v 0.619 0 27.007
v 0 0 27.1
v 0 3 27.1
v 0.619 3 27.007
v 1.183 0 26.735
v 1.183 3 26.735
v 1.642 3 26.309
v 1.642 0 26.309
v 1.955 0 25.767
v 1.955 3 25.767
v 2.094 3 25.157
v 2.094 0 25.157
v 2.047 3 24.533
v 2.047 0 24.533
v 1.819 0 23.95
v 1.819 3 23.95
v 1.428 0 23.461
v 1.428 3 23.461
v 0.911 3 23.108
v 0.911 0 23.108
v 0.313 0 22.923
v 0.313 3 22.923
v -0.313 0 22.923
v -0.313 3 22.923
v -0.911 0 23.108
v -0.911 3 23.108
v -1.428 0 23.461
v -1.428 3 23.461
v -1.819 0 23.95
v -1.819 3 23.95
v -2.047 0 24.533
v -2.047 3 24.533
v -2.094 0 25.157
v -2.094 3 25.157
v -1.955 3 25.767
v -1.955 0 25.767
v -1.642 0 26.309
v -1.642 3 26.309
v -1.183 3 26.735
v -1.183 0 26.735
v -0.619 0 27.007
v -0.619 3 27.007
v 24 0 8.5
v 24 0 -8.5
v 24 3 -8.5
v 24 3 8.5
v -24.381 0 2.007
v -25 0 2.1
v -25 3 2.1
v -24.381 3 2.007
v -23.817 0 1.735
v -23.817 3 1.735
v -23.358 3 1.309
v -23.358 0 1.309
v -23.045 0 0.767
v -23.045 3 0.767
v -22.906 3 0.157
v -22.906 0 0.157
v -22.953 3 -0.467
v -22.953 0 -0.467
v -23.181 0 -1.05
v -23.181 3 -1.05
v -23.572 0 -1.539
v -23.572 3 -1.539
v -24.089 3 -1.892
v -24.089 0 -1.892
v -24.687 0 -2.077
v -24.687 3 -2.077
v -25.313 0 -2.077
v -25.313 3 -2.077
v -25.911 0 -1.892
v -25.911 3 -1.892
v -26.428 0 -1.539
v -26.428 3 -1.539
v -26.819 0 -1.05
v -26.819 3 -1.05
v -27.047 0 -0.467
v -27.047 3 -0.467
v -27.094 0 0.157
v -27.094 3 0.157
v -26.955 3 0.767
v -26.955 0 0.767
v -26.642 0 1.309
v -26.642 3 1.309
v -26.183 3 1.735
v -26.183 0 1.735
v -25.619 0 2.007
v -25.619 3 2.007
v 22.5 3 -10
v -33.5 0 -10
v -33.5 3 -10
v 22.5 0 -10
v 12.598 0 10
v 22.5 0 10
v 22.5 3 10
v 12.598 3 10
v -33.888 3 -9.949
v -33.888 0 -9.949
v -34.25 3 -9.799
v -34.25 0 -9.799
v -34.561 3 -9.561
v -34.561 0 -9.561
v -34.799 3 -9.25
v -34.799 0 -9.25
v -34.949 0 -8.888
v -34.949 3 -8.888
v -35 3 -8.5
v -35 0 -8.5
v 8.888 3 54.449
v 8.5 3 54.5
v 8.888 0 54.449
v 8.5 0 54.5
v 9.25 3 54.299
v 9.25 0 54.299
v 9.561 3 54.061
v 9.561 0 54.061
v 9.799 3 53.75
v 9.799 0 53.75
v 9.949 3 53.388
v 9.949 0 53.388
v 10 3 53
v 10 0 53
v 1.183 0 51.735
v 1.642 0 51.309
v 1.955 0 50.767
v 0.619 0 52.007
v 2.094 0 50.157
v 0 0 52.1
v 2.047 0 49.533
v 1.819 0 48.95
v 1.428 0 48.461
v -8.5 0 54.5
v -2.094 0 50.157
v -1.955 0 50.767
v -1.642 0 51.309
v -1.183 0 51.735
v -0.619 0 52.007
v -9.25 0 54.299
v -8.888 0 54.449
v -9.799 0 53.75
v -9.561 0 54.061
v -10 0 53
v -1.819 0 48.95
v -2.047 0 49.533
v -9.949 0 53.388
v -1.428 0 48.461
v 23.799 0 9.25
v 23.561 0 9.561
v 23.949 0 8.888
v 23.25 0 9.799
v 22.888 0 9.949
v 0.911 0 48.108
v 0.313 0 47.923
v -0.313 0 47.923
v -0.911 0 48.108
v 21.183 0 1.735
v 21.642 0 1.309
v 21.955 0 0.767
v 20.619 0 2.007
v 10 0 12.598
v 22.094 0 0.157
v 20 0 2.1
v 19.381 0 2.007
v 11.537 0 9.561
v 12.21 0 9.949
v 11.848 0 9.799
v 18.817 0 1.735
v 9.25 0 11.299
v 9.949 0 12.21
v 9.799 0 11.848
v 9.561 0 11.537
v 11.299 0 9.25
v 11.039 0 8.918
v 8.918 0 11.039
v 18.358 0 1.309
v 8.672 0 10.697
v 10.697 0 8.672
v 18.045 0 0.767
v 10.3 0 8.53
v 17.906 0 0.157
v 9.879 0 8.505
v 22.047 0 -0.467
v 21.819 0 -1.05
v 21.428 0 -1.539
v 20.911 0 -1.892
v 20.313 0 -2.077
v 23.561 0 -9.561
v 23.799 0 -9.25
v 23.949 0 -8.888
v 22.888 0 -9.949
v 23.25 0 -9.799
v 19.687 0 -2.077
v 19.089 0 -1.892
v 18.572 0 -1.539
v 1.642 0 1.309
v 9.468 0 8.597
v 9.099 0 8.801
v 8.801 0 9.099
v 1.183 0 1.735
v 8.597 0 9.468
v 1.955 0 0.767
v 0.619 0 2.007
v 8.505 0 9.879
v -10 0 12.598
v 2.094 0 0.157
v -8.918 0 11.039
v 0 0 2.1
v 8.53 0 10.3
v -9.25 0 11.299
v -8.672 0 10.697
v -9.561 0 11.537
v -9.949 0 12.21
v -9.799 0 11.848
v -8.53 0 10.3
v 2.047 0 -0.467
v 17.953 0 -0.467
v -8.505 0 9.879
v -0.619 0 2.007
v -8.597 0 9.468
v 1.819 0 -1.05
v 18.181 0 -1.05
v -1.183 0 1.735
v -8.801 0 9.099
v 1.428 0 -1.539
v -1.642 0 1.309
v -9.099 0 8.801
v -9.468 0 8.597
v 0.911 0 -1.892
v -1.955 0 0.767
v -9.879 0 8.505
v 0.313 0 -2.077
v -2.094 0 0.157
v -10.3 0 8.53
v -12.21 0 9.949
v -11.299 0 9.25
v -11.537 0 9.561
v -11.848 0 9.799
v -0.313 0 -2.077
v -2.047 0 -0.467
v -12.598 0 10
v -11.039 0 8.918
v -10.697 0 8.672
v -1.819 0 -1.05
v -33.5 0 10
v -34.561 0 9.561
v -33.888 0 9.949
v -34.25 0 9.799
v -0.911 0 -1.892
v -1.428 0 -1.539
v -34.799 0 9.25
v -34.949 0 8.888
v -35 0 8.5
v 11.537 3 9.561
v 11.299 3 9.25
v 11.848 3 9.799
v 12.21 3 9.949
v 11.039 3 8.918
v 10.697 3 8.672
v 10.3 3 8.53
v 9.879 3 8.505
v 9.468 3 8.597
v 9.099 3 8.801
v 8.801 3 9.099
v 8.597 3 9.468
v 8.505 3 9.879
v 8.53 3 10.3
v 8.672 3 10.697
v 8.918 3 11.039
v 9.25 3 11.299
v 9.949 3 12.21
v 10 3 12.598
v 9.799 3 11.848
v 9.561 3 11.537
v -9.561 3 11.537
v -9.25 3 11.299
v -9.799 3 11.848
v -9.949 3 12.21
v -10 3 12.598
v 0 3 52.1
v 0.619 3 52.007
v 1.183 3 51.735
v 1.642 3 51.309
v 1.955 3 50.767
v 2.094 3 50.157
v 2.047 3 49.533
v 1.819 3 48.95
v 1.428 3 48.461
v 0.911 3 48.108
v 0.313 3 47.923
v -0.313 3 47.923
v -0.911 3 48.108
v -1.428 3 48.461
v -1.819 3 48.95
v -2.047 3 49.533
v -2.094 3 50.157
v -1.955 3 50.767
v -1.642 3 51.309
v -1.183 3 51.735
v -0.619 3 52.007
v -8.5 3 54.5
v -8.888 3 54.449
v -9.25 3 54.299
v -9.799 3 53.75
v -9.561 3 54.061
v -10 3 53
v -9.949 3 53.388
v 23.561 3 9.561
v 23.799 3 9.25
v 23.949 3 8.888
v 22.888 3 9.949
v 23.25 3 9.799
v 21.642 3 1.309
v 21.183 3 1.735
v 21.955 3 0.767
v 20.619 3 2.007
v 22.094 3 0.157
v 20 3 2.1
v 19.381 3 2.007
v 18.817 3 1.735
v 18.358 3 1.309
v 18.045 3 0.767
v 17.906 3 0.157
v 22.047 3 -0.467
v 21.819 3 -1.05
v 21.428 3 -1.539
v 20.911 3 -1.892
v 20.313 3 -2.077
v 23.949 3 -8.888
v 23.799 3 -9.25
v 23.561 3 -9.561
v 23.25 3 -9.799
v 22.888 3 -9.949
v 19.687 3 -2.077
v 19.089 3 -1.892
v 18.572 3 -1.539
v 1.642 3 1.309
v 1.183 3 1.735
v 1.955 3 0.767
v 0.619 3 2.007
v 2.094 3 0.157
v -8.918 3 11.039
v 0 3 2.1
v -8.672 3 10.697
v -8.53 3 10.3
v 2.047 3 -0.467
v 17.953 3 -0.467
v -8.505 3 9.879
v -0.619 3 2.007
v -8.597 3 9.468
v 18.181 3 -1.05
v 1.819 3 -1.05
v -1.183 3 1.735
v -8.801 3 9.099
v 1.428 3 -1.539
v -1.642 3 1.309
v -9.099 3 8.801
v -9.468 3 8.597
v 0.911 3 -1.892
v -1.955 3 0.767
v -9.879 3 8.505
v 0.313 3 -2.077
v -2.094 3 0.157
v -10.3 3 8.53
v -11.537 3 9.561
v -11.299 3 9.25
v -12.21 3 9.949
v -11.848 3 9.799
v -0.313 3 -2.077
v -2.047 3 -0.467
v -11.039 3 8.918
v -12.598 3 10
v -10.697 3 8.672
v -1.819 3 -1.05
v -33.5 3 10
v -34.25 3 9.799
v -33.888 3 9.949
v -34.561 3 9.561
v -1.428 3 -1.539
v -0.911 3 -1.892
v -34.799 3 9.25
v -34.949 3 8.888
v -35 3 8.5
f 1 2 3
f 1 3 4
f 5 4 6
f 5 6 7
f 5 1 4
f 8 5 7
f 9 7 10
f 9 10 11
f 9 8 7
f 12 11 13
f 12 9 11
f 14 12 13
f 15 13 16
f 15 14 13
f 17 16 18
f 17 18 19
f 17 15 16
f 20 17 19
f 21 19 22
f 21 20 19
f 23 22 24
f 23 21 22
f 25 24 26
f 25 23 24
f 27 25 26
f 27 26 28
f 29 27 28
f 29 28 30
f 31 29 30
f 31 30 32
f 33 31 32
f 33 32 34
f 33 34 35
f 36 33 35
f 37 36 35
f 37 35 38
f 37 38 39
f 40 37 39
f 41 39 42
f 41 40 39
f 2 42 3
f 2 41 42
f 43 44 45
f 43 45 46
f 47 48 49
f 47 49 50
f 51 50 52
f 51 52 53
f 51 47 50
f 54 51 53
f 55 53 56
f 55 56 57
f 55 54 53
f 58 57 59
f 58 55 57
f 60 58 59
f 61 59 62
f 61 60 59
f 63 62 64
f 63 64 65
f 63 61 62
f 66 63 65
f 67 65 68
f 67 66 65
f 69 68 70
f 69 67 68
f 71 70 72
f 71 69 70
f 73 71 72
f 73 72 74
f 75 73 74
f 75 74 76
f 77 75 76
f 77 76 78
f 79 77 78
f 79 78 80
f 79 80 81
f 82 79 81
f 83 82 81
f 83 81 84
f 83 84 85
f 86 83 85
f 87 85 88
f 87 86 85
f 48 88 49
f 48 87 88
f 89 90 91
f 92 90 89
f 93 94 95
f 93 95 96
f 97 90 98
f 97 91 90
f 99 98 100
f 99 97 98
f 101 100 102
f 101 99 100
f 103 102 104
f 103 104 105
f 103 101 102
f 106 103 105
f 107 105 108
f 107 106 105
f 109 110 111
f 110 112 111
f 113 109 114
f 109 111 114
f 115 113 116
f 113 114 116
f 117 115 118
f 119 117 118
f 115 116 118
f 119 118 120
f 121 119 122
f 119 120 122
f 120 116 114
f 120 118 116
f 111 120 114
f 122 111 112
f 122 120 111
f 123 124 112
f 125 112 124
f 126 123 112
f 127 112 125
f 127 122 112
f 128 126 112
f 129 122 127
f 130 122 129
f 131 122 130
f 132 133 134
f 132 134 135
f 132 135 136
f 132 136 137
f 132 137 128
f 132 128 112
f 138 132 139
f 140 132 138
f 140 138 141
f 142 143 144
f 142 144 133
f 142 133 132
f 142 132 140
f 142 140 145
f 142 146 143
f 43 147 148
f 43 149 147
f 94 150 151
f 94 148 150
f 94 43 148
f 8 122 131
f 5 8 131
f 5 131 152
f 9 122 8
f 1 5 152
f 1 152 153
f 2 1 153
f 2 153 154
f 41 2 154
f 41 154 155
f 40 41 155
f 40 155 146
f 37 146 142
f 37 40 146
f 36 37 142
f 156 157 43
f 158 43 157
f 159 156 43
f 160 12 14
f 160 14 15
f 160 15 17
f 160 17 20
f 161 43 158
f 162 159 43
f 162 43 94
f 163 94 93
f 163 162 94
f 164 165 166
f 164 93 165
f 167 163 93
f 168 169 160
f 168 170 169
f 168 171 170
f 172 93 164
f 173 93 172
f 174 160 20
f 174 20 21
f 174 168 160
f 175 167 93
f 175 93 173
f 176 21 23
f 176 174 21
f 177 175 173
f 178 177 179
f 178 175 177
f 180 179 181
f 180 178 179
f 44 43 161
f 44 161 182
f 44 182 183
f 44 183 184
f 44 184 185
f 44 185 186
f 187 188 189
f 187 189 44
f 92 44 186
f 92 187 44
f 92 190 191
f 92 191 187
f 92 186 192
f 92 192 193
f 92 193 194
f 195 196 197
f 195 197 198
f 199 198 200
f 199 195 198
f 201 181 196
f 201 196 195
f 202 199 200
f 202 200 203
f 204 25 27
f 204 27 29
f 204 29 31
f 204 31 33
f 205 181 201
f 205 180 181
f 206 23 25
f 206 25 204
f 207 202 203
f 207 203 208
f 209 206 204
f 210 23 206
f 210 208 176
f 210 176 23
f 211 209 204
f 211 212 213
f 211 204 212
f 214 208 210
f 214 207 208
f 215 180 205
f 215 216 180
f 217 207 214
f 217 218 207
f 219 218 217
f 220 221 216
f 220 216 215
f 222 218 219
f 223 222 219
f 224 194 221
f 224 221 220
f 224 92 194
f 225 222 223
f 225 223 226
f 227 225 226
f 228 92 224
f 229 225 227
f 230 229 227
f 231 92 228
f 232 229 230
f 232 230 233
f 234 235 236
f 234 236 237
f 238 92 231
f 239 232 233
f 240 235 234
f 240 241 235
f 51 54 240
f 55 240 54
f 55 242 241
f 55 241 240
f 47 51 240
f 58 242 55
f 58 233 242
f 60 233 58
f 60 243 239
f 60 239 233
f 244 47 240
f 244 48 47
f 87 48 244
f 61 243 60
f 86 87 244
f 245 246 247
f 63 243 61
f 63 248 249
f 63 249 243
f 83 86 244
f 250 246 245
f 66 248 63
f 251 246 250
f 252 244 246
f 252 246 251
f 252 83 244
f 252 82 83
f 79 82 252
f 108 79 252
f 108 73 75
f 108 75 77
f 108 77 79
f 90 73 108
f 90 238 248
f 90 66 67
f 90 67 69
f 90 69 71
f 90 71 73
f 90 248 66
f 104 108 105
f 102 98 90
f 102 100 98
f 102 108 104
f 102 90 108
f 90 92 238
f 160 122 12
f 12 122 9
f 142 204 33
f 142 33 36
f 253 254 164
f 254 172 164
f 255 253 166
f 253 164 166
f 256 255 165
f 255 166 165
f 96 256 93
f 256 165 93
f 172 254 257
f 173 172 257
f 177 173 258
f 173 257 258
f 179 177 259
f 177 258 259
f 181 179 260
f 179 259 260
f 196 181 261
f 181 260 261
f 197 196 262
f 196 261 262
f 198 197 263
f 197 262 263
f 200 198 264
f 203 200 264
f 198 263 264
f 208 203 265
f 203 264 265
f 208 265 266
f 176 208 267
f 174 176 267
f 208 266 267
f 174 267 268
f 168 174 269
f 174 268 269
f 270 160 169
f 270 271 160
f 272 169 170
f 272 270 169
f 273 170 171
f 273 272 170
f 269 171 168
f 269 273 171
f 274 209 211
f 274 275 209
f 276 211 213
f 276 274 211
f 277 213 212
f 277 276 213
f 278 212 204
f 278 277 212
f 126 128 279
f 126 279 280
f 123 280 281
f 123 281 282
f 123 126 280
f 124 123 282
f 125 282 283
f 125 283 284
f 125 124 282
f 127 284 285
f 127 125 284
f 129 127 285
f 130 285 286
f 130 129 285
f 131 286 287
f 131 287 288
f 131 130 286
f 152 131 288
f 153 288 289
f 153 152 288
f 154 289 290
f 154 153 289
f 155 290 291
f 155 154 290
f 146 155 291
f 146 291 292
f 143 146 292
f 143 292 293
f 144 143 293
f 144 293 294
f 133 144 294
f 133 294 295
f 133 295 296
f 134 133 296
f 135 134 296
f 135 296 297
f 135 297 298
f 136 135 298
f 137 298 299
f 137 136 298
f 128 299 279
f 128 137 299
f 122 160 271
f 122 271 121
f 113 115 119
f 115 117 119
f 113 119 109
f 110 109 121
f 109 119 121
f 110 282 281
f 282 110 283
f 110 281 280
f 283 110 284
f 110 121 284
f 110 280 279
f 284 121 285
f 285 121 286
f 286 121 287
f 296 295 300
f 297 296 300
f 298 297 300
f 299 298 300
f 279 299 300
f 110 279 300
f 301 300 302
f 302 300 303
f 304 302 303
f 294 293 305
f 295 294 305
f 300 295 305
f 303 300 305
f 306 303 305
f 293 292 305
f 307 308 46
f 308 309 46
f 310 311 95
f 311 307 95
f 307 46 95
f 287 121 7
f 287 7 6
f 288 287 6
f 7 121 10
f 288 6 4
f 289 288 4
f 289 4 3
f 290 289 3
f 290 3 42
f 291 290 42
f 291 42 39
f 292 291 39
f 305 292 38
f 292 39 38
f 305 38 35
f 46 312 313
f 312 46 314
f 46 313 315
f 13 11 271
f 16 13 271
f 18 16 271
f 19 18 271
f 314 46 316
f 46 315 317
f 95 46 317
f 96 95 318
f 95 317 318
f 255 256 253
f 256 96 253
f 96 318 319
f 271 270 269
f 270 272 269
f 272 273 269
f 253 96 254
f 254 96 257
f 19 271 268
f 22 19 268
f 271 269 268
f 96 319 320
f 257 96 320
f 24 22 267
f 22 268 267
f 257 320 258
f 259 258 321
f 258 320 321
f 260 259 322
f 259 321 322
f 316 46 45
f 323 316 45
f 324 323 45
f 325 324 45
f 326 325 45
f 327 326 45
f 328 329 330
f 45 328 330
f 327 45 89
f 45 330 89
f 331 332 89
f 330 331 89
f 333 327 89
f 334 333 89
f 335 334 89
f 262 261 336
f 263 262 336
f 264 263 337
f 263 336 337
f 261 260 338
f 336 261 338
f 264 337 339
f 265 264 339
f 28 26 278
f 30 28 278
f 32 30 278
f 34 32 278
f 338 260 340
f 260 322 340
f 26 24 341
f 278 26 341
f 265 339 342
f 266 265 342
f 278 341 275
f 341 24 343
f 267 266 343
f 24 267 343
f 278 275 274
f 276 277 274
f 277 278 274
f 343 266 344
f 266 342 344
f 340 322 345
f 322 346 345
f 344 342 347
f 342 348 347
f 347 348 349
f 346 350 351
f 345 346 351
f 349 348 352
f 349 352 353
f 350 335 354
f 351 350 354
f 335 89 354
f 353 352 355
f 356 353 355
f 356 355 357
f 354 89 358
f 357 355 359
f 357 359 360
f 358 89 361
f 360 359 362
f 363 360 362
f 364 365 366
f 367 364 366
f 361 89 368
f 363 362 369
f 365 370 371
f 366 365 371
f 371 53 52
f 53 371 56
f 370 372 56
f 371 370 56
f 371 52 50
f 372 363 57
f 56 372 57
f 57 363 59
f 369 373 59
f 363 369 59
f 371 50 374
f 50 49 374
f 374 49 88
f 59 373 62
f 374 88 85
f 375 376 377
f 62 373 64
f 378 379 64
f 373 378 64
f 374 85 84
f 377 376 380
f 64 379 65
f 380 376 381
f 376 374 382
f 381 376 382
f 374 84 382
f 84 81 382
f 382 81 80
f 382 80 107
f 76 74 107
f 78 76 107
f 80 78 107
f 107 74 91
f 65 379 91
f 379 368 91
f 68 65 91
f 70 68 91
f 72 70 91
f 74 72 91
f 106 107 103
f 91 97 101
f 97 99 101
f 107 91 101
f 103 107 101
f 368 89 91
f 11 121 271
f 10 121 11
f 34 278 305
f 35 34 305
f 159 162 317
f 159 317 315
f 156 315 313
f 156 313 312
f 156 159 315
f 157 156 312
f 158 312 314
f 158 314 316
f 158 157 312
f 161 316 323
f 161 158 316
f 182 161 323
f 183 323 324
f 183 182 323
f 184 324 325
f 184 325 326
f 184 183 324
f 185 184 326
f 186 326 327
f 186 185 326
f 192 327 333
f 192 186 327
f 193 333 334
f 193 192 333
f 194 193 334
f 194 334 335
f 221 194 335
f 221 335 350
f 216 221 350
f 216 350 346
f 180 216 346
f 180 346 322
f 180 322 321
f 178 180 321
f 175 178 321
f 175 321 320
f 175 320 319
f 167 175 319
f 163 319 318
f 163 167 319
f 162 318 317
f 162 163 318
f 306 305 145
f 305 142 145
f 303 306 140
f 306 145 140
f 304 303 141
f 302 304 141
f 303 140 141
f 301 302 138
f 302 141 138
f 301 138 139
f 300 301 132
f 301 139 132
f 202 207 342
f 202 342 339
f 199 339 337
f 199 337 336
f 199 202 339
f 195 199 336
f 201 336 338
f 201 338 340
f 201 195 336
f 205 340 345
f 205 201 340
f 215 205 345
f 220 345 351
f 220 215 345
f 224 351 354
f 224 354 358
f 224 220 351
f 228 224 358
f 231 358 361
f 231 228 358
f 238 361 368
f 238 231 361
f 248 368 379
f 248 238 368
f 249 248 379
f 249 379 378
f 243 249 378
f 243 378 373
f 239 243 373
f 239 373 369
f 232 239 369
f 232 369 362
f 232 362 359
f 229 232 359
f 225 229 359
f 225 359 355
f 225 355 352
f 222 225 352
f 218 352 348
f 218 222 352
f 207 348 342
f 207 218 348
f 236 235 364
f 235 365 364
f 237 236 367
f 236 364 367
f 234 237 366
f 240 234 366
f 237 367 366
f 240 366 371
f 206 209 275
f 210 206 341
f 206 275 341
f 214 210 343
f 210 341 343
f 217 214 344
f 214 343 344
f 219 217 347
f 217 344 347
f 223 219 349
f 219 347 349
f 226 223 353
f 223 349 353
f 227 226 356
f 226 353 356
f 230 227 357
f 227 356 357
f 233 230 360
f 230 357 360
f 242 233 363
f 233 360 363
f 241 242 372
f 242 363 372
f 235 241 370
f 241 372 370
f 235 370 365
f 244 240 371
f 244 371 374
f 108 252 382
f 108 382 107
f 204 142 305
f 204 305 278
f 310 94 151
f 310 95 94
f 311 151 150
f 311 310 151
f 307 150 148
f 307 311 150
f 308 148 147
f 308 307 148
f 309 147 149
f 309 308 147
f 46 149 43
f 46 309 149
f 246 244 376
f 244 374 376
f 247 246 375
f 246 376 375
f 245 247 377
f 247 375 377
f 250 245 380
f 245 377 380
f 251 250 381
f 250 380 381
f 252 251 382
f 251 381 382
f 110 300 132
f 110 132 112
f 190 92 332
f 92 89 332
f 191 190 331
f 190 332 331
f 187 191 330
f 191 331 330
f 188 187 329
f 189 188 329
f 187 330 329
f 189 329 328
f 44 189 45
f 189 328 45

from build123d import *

# Parameters (mm, degrees)
SKETCH_1_R          = 2.1
EXTRUDE_1_DEPTH     = 3
SKETCH_2_W          = 20
SKETCH_2_H          = 5.5
CUT_EXTRUDE_1_DEPTH = 3
SKETCH_3_R          = 1.5
CUT_EXTRUDE_3_DEPTH = 3
FILLET_2_R          = 1.5


with BuildPart() as part:
    # 草图1 → 凸台-拉伸1 (new body)
    with BuildSketch(Plane(origin=(0, 0, 0), x_dir=(1, 0, 0), z_dir=(0, 1, 0))):
        Polygon((-35, 10), (24, 10), (24, -10), (10, -10), (10, -60), (-10, -60), (-10, -10), (-35, -10), align=None)
        with Locations(Location((0, 0, 0), (0, 0, 270))):
            Circle(SKETCH_1_R, mode=Mode.SUBTRACT)
        with Locations(Location((20, 0, 0), (0, 0, 270))):
            Circle(SKETCH_1_R, mode=Mode.SUBTRACT)
        with Locations(Location((-25, 0, 0), (0, 0, 270))):
            Circle(SKETCH_1_R, mode=Mode.SUBTRACT)
        with Locations(Location((0, -25, 0), (0, 0, 270))):
            Circle(SKETCH_1_R, mode=Mode.SUBTRACT)
        with Locations(Location((0, -50, 0), (0, 0, 270))):
            Circle(SKETCH_1_R, mode=Mode.SUBTRACT)
    extrude(amount=EXTRUDE_1_DEPTH)

    # 草图2 → 切除-拉伸1 (cut)
    with BuildSketch(Plane(origin=(0, 3, 0), x_dir=(1, 0, 0), z_dir=(0, 1, 0))):
        with Locations((0, -57.25)):
            Rectangle(SKETCH_2_W, SKETCH_2_H)
    extrude(amount=-CUT_EXTRUDE_1_DEPTH, mode=Mode.SUBTRACT)

    # 草图3 → 切除-拉伸3 (cut)
    with BuildSketch(Plane(origin=(0, 3, 0), x_dir=(1, 0, 0), z_dir=(0, 1, 0))):
        with Locations((10, -10)):
            Circle(SKETCH_3_R)
        with Locations((-10, -10)):
            Circle(SKETCH_3_R)
    extrude(amount=-CUT_EXTRUDE_3_DEPTH, mode=Mode.SUBTRACT)

    # 圆角2
    fillet_2_edges = [part.edges().sort_by_distance(p)[0] for p in [
        (-35, 1.5, 10),
        (-35, 1.5, -10),
        (24, 1.5, -10),
        (24, 1.5, 10),
        (-10, 1.5, 54.5),
        (10, 1.5, 54.5),
        (11.5, 1.5, 10),
        (-10, 1.5, 11.5),
        (10, 1.5, 11.5),
        (-11.5, 1.5, 10),
    ]]
    fillet(fillet_2_edges, radius=FILLET_2_R)


solid = part.part
